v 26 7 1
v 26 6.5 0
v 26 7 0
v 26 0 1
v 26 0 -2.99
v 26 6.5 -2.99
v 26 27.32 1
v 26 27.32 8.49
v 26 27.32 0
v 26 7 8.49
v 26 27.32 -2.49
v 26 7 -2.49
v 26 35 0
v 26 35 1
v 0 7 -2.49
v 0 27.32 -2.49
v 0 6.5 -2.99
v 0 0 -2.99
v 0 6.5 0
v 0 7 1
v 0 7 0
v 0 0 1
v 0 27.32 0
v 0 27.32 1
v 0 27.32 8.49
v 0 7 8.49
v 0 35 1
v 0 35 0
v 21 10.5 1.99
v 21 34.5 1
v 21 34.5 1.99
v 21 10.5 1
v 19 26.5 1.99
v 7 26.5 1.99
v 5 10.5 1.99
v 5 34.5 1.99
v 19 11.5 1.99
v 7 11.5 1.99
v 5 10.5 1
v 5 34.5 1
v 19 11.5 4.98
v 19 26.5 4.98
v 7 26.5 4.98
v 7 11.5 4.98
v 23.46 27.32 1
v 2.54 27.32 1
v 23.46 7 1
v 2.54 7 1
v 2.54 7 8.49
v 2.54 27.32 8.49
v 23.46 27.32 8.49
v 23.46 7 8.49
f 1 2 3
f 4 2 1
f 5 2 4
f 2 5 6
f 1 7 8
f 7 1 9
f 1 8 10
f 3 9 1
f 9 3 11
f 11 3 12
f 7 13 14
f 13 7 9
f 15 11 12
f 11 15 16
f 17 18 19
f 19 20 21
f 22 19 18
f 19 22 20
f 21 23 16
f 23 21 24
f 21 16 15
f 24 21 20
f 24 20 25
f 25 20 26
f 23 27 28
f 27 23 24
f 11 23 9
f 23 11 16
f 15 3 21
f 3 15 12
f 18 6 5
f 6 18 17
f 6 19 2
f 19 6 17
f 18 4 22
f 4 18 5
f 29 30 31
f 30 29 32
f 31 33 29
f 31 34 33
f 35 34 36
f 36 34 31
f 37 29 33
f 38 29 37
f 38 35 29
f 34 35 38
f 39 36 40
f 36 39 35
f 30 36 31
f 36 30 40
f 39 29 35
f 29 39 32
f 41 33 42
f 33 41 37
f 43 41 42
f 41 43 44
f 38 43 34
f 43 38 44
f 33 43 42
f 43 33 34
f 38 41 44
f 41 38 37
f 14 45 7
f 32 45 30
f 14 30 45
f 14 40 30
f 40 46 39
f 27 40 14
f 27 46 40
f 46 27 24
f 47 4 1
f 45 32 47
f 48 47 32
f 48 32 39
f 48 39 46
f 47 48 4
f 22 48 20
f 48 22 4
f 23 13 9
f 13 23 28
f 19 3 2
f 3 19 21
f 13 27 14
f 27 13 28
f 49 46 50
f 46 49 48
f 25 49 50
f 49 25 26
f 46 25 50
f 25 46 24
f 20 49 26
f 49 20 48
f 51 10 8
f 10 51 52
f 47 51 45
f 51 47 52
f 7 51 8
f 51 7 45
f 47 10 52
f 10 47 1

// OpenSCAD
// file: esp8266mod.scad
include <../electronics/config.scad>;


/**
 * PCB with Espressif ESP8266 Wifi MCU and onboard antenna
 */
module esp8266mod(
            // PCB outline
            pcb_color = "black",
            pcb_size_x = 16.0,
            pcb_size_y = 24.0,
            pcb_size_z = 1.0,

            // MCU shield outline
            shield_color = "lightgray",
            shield_size_x = 12,
            shield_size_y = 15,
            shield_size_z = 3,
            shield_inset_x = 2,
            shield_inset_y = 1
        )
{
    // Board
    color(pcb_color)
    cube([pcb_size_x, pcb_size_y, pcb_size_z]);

    // MCU shield
    color(shield_color)
    translate([shield_inset_x, shield_inset_y, pcb_size_z-nothing])
    cube([shield_size_x, shield_size_y, shield_size_z]);
}

esp8266mod();
// file: pins.scad
module socket(count, spacing=2.54)
{
    // Component-specific parameters
    socket_color = "black";
    socket_z = 7.5;

    pin_color = "lightgray";
    pin_radius = spacing/4;
    pin_z = 2;


    // Solder pin
    // color(pin_color)
    // translate([spacing/2, spacing/2, -pin_z])
    // cylinder(
    //         r = pin_radius,
    //         h = pin_z + nothing
    //     );

    // Socket
    color(socket_color)
    translate([-spacing/2, 0, 0])
    cube([spacing, count*spacing, socket_z]);
}


module pins(count, spacing=2.54)
{
    socket(count, spacing);

    // TODO...
}
// file: ../electronics/config.scad
// Rendering: Level of detail
$fn = 80;

// Quickfix for rendering artifacts on overlapping surfaces
nothing = 0.01;

/*
 * Globally relevant model parameters
 */
adapter_pcb_size_x = 26;
adapter_pcb_size_y = 29;
adapter_pcb_size_z = 1.0;
adapter_pin_spacing = 2.54;

sensor_pcb_size_x = 20;
sensor_pcb_size_y = 20;
sensor_pcb_size_z = 1.0;

led_socket_pin_spacing = 2.54;
led_socket_pin_count = 4;
led_socket_size_x = led_socket_pin_count * led_socket_pin_spacing;
led_diameter = 5.0;
// main file
include <../electronics/config.scad>;
use <pins.scad>;
use <esp8266mod.scad>;


/**
 * D1-mini breakout board with Espressif ESP8266 Wifi MCU module
 */
module d1_mini(
            // PCB outline
            pcb_color = "darkblue",
            pcb_size_x = 26.0,
            pcb_size_y = 35.0,
            pcb_size_z = 1.0,

            // Pins
            pin_color = "black",
            pin_spacing = 2.54,
            pin_count = 8,
            pins_size_z = 7.5,
            pins_inset_y = 7.0,

            // Placeholders for SMD components
            smd_color = "gray",
            smd_size_z = 2.5,
            placeholder_size_y = 6.5,
            placeholder_size_z = 3.0,

            // MCU module
            mod_inset_x = 5.0,
            mod_inset_y = 10.5
        )
{
    pins_size_y = pin_count * pin_spacing;
    pins_size_x = pin_spacing;

    // PCB outline
    color(pcb_color)
    cube([pcb_size_x, pcb_size_y, pcb_size_z]);

    // Pins left
    translate([
        pin_spacing/2,
        pins_inset_y,
        pcb_size_z - nothing
    ])
    socket(pin_count, spacing=pin_spacing);

    // Pins right
    translate([
        pcb_size_x - pin_spacing/2,
        pins_inset_y,
        pcb_size_z - nothing
    ])
    pins(pin_count, spacing=pin_spacing);

    // Generic placeholders
    color(smd_color)
    {
        // SMD parts
        translate([0, pins_inset_y, -smd_size_z + nothing])
        cube([
            pcb_size_x,
            pins_size_y,
            smd_size_z
        ]);

        // USB port and reset button
        translate([0, 0, -placeholder_size_z + nothing])
        cube([
            pcb_size_x,
            placeholder_size_y,
            placeholder_size_z
        ]);
    }

    // MCU board
    translate([mod_inset_x, mod_inset_y, pcb_size_z-nothing])
    esp8266mod();
}

d1_mini();
